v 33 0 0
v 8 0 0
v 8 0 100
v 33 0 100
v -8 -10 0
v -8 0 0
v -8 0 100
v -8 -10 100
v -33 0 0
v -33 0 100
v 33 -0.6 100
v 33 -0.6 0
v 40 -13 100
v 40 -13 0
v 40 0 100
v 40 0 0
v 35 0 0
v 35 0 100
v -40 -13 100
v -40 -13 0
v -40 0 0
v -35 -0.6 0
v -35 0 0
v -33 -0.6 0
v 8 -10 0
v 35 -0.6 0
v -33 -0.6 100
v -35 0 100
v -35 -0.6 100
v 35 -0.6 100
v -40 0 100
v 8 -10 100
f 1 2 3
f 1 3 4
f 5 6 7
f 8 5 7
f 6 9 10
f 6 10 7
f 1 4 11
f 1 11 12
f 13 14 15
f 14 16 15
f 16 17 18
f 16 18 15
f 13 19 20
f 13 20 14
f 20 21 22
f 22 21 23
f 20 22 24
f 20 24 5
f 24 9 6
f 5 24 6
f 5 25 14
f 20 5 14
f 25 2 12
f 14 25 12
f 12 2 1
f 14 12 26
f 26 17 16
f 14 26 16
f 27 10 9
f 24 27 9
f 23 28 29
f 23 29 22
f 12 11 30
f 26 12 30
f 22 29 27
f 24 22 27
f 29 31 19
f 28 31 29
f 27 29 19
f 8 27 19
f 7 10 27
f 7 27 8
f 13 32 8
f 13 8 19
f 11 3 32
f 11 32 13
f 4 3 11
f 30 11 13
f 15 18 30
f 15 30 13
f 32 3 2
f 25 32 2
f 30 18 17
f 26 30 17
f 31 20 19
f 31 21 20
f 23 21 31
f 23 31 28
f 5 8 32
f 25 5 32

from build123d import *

# Parameters (mm, degrees)
ESQUISSE3_W             = 80
ESQUISSE3_H             = 10
EXTRU_MINCE4_DEPTH      = 100
ESQUISSE4_W             = 2
ESQUISSE4_H             = 100
ENL_V_MAT_EXTRU_1_DEPTH = 0.6
ENL_V_MAT_EXTRU_2_DEPTH = 11
ESQUISSE6_W             = 80
ESQUISSE6_H             = 100
BOSS_EXTRU_1_DEPTH      = 3


with BuildPart() as part:
    # Esquisse3 → Extru.-Mince4 (new body)
    with BuildSketch(Plane.XY):
        with Locations((0, -5)):
            Rectangle(ESQUISSE3_W, ESQUISSE3_H)
    extrude(amount=EXTRU_MINCE4_DEPTH)

    # Esquisse4 → Enlèv. mat.-Extru.1 (cut)
    with BuildSketch(Plane(origin=(0, 0, 0), x_dir=(1, 0, 0), z_dir=(0, 1, 0))):
        with Locations((-34, -50)):
            Rectangle(ESQUISSE4_W, ESQUISSE4_H)
        with Locations((34, -50)):
            Rectangle(ESQUISSE4_W, ESQUISSE4_H)
    extrude(amount=-ENL_V_MAT_EXTRU_1_DEPTH, mode=Mode.SUBTRACT)

    # Esquisse5 → Enlèv. mat.-Extru.2 (cut)
    with BuildSketch(Plane(origin=(0, 0, 0), x_dir=(1, 0, 0), z_dir=(0, 1, 0))):
        Polygon((0, 0), (-8, 0), (-8, -100), (8, -100), (8, 0), align=None)
    extrude(amount=-ENL_V_MAT_EXTRU_2_DEPTH, mode=Mode.SUBTRACT)

    # Esquisse6 → Boss.-Extru.1 (add)
    with BuildSketch(Plane.XZ.offset(10)):
        with Locations((0, 50)):
            Rectangle(ESQUISSE6_W, ESQUISSE6_H)
    extrude(amount=BOSS_EXTRU_1_DEPTH)


solid = part.part
